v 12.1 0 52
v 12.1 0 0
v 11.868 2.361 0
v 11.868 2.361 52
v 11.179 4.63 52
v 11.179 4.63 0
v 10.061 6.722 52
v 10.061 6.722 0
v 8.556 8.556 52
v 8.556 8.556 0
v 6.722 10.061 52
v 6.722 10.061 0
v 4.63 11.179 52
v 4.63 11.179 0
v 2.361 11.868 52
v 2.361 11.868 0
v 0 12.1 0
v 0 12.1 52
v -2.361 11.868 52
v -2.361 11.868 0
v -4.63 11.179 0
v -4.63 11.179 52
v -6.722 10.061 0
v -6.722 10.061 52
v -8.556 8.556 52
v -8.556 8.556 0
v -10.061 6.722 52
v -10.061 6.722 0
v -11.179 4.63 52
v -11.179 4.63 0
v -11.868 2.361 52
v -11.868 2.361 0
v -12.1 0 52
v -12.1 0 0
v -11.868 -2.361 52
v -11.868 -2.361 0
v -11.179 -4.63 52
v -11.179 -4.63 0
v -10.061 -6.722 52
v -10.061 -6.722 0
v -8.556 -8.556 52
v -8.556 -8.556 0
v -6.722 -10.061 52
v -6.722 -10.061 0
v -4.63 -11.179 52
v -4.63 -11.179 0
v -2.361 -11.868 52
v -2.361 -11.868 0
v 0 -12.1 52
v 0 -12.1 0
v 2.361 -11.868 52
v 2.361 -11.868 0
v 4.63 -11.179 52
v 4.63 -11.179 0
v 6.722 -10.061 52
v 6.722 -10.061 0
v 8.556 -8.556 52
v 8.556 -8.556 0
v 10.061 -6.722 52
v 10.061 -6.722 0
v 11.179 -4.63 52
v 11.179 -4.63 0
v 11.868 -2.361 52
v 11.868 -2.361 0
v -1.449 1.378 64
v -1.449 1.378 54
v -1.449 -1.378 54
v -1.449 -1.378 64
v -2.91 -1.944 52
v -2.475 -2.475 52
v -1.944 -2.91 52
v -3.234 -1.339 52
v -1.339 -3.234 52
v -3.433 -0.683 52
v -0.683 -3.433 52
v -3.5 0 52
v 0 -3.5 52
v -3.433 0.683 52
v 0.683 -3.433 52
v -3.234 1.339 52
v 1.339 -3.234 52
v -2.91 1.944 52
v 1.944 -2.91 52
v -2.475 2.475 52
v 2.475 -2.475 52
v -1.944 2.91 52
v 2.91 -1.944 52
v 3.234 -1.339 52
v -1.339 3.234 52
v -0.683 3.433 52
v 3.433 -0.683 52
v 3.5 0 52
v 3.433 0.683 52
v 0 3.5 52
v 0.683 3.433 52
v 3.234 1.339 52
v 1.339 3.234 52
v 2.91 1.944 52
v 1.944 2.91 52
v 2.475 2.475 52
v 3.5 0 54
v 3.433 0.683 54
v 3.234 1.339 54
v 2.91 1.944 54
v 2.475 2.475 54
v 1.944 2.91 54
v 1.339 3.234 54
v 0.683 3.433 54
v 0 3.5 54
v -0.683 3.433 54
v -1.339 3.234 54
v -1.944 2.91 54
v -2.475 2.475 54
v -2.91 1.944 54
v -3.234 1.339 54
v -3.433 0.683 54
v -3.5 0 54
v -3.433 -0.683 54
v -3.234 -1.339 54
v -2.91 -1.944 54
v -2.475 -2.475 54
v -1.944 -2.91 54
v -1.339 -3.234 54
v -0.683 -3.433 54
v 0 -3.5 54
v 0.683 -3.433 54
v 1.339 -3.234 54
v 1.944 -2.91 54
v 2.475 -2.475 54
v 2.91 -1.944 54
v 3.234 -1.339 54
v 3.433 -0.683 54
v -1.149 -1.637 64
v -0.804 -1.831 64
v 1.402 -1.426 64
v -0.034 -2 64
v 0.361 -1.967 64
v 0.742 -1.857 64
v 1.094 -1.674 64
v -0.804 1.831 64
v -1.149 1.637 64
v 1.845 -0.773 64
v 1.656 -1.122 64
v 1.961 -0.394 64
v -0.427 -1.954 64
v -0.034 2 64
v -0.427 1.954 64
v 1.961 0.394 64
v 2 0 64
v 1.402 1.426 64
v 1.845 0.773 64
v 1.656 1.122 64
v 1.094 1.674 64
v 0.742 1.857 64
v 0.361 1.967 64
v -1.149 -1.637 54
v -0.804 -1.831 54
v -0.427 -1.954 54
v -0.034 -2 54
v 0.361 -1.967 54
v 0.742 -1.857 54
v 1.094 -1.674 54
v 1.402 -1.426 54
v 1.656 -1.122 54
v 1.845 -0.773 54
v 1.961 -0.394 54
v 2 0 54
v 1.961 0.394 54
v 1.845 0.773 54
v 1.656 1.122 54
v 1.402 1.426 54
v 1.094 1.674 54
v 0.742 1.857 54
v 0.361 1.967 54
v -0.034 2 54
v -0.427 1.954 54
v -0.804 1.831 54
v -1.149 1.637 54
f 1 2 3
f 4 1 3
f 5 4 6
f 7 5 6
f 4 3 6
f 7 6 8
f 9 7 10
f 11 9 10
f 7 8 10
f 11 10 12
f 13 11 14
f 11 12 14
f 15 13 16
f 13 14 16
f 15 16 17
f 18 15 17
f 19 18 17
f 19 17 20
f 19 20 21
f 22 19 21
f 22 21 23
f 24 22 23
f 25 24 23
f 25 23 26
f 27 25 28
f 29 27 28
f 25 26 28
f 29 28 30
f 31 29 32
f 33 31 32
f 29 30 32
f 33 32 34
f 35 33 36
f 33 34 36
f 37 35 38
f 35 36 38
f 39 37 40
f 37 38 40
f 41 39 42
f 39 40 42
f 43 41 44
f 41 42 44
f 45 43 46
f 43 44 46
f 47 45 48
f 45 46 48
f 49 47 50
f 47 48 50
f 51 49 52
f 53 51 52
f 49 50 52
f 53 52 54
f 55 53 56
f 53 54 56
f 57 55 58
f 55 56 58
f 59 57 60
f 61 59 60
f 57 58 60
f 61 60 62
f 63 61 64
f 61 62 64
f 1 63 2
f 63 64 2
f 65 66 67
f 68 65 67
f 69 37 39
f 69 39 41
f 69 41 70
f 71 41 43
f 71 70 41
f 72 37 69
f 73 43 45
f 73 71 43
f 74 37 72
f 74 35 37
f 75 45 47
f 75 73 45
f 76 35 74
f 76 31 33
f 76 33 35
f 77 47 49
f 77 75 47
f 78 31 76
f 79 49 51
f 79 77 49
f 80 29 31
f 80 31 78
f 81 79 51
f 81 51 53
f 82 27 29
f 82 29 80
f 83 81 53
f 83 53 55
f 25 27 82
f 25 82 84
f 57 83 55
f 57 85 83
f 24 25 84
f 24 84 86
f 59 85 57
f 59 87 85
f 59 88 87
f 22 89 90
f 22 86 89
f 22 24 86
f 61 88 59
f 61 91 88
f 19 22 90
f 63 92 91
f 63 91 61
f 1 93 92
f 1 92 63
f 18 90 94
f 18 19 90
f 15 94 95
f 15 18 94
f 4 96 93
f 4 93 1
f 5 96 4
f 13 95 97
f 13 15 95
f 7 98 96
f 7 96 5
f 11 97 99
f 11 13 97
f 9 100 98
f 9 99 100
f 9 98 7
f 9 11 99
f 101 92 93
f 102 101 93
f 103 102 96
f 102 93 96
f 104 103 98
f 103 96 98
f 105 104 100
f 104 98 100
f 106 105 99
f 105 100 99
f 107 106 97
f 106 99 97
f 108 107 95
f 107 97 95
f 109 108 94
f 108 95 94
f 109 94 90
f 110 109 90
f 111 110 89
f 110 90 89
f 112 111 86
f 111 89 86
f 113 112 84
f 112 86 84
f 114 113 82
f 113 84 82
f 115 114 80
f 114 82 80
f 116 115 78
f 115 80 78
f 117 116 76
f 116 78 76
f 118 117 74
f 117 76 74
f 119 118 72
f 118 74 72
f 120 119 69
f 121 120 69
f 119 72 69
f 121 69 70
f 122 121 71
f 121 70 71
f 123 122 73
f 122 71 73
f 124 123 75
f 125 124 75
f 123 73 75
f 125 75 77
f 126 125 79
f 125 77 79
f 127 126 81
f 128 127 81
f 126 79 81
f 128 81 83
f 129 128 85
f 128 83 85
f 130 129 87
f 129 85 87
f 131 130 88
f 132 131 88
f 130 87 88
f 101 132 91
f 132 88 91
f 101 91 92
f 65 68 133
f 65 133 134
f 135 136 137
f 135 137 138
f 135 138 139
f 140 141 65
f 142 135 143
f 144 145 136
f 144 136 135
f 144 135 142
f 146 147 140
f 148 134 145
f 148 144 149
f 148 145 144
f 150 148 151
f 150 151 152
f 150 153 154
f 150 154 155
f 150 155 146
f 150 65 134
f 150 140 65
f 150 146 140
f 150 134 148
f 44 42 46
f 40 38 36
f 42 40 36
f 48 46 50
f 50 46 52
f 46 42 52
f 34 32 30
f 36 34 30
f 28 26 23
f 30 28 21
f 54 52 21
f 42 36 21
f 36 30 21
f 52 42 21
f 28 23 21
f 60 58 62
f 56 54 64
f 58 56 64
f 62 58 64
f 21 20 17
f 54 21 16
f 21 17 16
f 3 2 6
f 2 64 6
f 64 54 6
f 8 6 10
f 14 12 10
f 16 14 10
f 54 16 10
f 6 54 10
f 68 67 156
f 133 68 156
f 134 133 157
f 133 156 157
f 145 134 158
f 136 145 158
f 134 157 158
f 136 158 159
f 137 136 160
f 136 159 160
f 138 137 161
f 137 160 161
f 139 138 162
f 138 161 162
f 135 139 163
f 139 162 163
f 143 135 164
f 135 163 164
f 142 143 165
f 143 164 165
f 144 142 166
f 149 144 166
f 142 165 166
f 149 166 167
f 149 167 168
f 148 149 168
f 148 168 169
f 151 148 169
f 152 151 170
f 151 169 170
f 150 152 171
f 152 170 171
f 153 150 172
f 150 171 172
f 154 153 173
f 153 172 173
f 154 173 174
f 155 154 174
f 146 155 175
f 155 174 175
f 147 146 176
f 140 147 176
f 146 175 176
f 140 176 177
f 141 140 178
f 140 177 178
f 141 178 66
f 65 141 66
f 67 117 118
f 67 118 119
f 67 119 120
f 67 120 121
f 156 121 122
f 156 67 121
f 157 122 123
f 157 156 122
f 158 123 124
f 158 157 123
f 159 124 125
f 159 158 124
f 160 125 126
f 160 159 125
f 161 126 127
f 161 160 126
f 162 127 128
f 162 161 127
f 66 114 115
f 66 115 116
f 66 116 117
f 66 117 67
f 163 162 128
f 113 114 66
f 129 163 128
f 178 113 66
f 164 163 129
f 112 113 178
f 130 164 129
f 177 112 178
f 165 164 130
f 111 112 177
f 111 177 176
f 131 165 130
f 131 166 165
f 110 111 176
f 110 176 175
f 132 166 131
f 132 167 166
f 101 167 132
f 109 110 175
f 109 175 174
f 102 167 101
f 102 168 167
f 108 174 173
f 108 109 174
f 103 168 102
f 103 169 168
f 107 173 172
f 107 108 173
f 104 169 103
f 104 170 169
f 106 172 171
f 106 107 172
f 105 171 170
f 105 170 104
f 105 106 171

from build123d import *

# Parameters (mm, degrees)
SKETCH1_R           = 12.1
BOSS_EXTRUDE1_DEPTH = 52
SKETCH2_R           = 3.5
BOSS_EXTRUDE2_DEPTH = 2
BOSS_EXTRUDE3_DEPTH = 10


with BuildPart() as part:
    # Sketch1 → Boss-Extrude1 (new body)
    with BuildSketch(Plane.XY):
        Circle(SKETCH1_R)
    extrude(amount=BOSS_EXTRUDE1_DEPTH)

    # Sketch2 → Boss-Extrude2 (add)
    with BuildSketch(Plane.XY.offset(52)):
        Circle(SKETCH2_R)
    extrude(amount=BOSS_EXTRUDE2_DEPTH)

    # Sketch4 → Boss-Extrude3 (add)
    with BuildSketch(Plane.XY.offset(54)):
        with BuildLine():
            Line((-1.449347592, 1.378184152), (-1.449347592, -1.378184152))
            ThreePointArc((-1.449347592, -1.378184152), (2, 0), (-1.449347592, 1.378184152))
        make_face()
    extrude(amount=BOSS_EXTRUDE3_DEPTH)


solid = part.part
